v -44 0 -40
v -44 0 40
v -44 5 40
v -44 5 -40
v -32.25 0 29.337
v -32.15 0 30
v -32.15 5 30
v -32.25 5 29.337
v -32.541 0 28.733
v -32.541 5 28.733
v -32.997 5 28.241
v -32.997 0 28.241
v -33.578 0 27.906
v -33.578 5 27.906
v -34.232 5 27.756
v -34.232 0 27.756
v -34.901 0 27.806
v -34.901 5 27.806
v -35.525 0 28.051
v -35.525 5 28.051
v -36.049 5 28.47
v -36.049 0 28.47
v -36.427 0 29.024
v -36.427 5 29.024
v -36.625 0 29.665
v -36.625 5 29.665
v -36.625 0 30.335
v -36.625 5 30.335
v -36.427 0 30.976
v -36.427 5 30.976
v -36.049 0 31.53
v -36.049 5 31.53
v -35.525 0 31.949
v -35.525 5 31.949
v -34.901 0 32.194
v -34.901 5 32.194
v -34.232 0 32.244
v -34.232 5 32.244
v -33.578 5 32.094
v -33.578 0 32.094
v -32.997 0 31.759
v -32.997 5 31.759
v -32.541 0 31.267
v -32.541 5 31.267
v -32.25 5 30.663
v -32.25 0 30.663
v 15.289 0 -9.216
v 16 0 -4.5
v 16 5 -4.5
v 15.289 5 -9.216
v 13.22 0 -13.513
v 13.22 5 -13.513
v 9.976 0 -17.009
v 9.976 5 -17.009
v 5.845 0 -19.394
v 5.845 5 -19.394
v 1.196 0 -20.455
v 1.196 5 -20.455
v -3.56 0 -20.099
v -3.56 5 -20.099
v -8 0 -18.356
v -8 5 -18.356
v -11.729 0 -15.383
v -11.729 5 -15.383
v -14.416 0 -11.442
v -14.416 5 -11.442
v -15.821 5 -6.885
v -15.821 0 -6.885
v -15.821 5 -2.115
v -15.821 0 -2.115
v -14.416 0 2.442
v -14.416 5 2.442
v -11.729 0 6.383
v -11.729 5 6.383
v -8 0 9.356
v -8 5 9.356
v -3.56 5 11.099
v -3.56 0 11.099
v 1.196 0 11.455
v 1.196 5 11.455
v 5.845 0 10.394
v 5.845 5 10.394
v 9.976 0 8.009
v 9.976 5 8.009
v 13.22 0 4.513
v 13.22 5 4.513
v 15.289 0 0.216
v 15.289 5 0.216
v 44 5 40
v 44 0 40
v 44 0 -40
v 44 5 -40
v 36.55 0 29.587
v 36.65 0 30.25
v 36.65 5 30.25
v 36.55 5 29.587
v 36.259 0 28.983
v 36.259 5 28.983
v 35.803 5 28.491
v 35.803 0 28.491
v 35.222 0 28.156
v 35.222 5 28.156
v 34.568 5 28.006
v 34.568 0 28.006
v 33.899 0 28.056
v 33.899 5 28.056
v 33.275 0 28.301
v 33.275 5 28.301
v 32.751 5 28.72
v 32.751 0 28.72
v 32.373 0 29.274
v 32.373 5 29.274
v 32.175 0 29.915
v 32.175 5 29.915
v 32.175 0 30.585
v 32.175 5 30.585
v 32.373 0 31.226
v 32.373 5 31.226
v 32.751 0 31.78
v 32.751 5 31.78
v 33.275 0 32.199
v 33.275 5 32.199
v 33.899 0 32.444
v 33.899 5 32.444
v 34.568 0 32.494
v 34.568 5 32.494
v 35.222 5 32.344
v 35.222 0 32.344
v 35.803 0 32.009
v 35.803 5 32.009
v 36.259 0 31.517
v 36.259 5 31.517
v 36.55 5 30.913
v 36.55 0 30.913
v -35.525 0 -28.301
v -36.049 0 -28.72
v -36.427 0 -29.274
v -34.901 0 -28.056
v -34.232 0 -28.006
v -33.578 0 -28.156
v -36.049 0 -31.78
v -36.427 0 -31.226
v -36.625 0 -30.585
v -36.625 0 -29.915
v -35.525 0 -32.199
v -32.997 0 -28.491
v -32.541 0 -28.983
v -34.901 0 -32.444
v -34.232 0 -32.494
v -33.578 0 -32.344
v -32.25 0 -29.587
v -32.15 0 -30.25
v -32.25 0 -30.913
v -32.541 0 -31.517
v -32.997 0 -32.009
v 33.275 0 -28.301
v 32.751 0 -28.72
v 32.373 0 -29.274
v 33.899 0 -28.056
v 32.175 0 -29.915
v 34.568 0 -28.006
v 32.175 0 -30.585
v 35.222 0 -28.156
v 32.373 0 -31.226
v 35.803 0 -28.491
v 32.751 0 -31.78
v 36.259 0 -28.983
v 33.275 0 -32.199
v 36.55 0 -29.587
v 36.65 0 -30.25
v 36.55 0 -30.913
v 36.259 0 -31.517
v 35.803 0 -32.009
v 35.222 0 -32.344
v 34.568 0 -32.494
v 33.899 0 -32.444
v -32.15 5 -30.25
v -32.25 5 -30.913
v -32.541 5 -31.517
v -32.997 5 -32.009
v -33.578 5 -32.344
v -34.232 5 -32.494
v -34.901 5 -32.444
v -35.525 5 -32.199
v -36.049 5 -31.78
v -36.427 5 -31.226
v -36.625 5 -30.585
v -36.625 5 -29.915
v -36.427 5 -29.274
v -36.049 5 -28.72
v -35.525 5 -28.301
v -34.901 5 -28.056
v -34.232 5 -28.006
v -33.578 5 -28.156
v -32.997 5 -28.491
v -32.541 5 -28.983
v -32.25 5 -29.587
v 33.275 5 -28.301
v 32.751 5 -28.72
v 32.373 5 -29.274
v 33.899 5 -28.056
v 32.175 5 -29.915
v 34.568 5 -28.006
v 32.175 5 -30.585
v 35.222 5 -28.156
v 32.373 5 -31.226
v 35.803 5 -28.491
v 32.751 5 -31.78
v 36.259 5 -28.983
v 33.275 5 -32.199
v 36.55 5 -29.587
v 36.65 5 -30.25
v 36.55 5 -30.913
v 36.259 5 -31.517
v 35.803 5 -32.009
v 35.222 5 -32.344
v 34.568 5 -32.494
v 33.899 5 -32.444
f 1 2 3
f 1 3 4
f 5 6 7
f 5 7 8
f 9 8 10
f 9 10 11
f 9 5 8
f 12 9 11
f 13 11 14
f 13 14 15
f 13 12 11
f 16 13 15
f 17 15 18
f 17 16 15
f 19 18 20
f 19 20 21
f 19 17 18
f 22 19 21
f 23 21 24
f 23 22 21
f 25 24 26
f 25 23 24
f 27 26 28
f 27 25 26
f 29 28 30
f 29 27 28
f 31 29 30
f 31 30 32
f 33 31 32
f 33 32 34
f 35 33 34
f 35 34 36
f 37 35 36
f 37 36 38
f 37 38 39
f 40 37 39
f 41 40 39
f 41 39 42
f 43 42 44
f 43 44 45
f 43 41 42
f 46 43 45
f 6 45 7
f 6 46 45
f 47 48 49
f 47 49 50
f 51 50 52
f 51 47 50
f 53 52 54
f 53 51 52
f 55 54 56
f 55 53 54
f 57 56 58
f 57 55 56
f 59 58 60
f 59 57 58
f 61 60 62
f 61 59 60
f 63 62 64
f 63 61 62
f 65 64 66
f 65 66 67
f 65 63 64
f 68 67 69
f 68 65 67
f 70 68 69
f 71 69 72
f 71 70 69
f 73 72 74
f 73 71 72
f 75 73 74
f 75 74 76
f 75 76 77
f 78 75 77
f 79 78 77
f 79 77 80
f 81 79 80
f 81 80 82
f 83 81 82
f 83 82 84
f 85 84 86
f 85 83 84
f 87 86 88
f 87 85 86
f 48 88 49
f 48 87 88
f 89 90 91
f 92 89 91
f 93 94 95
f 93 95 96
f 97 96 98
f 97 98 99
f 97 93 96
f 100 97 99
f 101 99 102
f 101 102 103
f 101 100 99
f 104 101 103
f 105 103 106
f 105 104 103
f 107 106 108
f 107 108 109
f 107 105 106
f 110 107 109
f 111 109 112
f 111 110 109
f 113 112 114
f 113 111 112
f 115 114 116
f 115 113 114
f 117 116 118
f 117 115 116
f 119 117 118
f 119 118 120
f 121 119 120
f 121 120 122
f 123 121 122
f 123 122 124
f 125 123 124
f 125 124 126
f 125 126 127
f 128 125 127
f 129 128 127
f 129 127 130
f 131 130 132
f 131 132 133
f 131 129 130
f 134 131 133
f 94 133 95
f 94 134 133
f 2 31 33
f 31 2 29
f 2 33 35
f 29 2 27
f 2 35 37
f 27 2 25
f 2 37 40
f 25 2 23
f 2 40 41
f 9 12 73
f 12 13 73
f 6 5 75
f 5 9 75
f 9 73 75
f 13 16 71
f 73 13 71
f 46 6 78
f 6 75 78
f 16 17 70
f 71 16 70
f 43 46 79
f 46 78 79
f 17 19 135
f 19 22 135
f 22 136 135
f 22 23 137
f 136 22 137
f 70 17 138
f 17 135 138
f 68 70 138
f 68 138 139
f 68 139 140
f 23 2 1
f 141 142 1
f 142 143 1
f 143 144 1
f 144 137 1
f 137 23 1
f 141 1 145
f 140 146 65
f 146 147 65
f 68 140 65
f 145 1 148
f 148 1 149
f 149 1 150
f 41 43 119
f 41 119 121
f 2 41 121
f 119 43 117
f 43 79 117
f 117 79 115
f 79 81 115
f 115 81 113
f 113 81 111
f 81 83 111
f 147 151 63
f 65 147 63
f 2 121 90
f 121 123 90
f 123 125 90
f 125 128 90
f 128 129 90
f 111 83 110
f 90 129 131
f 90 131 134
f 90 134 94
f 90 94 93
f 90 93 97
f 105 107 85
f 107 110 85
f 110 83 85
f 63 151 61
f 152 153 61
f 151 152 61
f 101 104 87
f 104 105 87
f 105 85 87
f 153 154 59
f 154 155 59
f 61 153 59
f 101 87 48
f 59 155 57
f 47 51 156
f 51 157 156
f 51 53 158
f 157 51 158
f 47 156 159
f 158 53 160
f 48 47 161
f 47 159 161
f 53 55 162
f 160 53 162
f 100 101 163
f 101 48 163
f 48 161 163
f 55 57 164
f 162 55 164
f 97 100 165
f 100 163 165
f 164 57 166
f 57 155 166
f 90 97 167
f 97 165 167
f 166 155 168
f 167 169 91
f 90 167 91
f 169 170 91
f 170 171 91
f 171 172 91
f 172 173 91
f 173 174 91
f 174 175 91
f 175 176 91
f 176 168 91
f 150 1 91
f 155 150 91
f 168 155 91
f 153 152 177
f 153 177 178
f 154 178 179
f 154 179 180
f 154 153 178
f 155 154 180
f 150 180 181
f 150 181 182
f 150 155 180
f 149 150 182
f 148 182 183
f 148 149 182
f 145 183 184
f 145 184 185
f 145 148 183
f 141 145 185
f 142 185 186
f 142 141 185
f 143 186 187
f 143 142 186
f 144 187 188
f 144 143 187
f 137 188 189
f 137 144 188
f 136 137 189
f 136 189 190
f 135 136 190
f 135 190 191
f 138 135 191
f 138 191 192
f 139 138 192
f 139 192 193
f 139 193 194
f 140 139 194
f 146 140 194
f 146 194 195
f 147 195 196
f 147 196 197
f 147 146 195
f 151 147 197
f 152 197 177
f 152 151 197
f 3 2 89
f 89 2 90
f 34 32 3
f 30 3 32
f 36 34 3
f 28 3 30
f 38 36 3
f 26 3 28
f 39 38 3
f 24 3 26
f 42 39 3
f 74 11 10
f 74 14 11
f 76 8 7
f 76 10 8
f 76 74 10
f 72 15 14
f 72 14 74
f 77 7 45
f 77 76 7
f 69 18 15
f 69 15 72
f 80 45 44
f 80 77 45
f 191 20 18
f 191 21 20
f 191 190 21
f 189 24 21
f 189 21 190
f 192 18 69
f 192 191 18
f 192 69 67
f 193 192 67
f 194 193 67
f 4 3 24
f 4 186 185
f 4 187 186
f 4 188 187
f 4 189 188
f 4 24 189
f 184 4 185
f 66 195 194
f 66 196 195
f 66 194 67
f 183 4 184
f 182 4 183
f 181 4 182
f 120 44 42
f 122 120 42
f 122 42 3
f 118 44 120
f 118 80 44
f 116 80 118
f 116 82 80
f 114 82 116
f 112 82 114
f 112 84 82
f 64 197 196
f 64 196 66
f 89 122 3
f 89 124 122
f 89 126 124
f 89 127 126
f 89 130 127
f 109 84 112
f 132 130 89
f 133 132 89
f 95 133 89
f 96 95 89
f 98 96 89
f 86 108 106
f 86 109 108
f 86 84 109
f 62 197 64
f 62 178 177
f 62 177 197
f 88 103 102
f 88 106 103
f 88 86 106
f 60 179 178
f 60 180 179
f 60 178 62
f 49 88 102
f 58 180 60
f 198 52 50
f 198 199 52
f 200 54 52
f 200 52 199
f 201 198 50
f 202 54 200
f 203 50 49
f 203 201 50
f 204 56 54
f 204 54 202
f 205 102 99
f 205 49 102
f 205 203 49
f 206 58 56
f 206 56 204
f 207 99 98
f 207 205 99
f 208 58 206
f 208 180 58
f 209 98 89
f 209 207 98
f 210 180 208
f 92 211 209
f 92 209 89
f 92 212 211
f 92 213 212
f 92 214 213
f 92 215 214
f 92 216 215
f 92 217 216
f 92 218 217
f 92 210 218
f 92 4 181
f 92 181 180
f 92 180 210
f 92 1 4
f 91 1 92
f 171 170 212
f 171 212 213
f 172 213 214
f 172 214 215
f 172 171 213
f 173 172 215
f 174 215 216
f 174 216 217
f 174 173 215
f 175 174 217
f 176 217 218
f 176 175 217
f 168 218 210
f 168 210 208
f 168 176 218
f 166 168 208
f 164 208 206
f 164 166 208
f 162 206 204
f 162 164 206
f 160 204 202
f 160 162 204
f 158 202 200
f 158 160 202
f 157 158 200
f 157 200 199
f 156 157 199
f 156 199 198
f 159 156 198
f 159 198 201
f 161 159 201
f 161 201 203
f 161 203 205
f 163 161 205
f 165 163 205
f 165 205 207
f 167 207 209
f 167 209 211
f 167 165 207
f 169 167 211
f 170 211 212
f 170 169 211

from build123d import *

# Parameters (mm, degrees)
SKETCH_1_W      = 88
SKETCH_1_H      = 80
SKETCH_1_R      = 2.25
SKETCH_1_R_2    = 16
EXTRUDE_1_DEPTH = 5


with BuildPart() as part:
    # Эскиз1 → Бобышка-Вытянуть1 (new body)
    with BuildSketch(Plane(origin=(0, 0, 0), x_dir=(1, 0, 0), z_dir=(0, 1, 0))):
        Rectangle(SKETCH_1_W, SKETCH_1_H)
        with Locations((-34.4, 30.25)):
            Circle(SKETCH_1_R, mode=Mode.SUBTRACT)
        with Locations((34.4, 30.25)):
            Circle(SKETCH_1_R, mode=Mode.SUBTRACT)
        with Locations((34.4, -30.25)):
            Circle(SKETCH_1_R, mode=Mode.SUBTRACT)
        with Locations((-34.4, -30)):
            Circle(SKETCH_1_R, mode=Mode.SUBTRACT)
        with Locations((0, 4.5)):
            Circle(SKETCH_1_R_2, mode=Mode.SUBTRACT)
    extrude(amount=EXTRUDE_1_DEPTH)


solid = part.part
